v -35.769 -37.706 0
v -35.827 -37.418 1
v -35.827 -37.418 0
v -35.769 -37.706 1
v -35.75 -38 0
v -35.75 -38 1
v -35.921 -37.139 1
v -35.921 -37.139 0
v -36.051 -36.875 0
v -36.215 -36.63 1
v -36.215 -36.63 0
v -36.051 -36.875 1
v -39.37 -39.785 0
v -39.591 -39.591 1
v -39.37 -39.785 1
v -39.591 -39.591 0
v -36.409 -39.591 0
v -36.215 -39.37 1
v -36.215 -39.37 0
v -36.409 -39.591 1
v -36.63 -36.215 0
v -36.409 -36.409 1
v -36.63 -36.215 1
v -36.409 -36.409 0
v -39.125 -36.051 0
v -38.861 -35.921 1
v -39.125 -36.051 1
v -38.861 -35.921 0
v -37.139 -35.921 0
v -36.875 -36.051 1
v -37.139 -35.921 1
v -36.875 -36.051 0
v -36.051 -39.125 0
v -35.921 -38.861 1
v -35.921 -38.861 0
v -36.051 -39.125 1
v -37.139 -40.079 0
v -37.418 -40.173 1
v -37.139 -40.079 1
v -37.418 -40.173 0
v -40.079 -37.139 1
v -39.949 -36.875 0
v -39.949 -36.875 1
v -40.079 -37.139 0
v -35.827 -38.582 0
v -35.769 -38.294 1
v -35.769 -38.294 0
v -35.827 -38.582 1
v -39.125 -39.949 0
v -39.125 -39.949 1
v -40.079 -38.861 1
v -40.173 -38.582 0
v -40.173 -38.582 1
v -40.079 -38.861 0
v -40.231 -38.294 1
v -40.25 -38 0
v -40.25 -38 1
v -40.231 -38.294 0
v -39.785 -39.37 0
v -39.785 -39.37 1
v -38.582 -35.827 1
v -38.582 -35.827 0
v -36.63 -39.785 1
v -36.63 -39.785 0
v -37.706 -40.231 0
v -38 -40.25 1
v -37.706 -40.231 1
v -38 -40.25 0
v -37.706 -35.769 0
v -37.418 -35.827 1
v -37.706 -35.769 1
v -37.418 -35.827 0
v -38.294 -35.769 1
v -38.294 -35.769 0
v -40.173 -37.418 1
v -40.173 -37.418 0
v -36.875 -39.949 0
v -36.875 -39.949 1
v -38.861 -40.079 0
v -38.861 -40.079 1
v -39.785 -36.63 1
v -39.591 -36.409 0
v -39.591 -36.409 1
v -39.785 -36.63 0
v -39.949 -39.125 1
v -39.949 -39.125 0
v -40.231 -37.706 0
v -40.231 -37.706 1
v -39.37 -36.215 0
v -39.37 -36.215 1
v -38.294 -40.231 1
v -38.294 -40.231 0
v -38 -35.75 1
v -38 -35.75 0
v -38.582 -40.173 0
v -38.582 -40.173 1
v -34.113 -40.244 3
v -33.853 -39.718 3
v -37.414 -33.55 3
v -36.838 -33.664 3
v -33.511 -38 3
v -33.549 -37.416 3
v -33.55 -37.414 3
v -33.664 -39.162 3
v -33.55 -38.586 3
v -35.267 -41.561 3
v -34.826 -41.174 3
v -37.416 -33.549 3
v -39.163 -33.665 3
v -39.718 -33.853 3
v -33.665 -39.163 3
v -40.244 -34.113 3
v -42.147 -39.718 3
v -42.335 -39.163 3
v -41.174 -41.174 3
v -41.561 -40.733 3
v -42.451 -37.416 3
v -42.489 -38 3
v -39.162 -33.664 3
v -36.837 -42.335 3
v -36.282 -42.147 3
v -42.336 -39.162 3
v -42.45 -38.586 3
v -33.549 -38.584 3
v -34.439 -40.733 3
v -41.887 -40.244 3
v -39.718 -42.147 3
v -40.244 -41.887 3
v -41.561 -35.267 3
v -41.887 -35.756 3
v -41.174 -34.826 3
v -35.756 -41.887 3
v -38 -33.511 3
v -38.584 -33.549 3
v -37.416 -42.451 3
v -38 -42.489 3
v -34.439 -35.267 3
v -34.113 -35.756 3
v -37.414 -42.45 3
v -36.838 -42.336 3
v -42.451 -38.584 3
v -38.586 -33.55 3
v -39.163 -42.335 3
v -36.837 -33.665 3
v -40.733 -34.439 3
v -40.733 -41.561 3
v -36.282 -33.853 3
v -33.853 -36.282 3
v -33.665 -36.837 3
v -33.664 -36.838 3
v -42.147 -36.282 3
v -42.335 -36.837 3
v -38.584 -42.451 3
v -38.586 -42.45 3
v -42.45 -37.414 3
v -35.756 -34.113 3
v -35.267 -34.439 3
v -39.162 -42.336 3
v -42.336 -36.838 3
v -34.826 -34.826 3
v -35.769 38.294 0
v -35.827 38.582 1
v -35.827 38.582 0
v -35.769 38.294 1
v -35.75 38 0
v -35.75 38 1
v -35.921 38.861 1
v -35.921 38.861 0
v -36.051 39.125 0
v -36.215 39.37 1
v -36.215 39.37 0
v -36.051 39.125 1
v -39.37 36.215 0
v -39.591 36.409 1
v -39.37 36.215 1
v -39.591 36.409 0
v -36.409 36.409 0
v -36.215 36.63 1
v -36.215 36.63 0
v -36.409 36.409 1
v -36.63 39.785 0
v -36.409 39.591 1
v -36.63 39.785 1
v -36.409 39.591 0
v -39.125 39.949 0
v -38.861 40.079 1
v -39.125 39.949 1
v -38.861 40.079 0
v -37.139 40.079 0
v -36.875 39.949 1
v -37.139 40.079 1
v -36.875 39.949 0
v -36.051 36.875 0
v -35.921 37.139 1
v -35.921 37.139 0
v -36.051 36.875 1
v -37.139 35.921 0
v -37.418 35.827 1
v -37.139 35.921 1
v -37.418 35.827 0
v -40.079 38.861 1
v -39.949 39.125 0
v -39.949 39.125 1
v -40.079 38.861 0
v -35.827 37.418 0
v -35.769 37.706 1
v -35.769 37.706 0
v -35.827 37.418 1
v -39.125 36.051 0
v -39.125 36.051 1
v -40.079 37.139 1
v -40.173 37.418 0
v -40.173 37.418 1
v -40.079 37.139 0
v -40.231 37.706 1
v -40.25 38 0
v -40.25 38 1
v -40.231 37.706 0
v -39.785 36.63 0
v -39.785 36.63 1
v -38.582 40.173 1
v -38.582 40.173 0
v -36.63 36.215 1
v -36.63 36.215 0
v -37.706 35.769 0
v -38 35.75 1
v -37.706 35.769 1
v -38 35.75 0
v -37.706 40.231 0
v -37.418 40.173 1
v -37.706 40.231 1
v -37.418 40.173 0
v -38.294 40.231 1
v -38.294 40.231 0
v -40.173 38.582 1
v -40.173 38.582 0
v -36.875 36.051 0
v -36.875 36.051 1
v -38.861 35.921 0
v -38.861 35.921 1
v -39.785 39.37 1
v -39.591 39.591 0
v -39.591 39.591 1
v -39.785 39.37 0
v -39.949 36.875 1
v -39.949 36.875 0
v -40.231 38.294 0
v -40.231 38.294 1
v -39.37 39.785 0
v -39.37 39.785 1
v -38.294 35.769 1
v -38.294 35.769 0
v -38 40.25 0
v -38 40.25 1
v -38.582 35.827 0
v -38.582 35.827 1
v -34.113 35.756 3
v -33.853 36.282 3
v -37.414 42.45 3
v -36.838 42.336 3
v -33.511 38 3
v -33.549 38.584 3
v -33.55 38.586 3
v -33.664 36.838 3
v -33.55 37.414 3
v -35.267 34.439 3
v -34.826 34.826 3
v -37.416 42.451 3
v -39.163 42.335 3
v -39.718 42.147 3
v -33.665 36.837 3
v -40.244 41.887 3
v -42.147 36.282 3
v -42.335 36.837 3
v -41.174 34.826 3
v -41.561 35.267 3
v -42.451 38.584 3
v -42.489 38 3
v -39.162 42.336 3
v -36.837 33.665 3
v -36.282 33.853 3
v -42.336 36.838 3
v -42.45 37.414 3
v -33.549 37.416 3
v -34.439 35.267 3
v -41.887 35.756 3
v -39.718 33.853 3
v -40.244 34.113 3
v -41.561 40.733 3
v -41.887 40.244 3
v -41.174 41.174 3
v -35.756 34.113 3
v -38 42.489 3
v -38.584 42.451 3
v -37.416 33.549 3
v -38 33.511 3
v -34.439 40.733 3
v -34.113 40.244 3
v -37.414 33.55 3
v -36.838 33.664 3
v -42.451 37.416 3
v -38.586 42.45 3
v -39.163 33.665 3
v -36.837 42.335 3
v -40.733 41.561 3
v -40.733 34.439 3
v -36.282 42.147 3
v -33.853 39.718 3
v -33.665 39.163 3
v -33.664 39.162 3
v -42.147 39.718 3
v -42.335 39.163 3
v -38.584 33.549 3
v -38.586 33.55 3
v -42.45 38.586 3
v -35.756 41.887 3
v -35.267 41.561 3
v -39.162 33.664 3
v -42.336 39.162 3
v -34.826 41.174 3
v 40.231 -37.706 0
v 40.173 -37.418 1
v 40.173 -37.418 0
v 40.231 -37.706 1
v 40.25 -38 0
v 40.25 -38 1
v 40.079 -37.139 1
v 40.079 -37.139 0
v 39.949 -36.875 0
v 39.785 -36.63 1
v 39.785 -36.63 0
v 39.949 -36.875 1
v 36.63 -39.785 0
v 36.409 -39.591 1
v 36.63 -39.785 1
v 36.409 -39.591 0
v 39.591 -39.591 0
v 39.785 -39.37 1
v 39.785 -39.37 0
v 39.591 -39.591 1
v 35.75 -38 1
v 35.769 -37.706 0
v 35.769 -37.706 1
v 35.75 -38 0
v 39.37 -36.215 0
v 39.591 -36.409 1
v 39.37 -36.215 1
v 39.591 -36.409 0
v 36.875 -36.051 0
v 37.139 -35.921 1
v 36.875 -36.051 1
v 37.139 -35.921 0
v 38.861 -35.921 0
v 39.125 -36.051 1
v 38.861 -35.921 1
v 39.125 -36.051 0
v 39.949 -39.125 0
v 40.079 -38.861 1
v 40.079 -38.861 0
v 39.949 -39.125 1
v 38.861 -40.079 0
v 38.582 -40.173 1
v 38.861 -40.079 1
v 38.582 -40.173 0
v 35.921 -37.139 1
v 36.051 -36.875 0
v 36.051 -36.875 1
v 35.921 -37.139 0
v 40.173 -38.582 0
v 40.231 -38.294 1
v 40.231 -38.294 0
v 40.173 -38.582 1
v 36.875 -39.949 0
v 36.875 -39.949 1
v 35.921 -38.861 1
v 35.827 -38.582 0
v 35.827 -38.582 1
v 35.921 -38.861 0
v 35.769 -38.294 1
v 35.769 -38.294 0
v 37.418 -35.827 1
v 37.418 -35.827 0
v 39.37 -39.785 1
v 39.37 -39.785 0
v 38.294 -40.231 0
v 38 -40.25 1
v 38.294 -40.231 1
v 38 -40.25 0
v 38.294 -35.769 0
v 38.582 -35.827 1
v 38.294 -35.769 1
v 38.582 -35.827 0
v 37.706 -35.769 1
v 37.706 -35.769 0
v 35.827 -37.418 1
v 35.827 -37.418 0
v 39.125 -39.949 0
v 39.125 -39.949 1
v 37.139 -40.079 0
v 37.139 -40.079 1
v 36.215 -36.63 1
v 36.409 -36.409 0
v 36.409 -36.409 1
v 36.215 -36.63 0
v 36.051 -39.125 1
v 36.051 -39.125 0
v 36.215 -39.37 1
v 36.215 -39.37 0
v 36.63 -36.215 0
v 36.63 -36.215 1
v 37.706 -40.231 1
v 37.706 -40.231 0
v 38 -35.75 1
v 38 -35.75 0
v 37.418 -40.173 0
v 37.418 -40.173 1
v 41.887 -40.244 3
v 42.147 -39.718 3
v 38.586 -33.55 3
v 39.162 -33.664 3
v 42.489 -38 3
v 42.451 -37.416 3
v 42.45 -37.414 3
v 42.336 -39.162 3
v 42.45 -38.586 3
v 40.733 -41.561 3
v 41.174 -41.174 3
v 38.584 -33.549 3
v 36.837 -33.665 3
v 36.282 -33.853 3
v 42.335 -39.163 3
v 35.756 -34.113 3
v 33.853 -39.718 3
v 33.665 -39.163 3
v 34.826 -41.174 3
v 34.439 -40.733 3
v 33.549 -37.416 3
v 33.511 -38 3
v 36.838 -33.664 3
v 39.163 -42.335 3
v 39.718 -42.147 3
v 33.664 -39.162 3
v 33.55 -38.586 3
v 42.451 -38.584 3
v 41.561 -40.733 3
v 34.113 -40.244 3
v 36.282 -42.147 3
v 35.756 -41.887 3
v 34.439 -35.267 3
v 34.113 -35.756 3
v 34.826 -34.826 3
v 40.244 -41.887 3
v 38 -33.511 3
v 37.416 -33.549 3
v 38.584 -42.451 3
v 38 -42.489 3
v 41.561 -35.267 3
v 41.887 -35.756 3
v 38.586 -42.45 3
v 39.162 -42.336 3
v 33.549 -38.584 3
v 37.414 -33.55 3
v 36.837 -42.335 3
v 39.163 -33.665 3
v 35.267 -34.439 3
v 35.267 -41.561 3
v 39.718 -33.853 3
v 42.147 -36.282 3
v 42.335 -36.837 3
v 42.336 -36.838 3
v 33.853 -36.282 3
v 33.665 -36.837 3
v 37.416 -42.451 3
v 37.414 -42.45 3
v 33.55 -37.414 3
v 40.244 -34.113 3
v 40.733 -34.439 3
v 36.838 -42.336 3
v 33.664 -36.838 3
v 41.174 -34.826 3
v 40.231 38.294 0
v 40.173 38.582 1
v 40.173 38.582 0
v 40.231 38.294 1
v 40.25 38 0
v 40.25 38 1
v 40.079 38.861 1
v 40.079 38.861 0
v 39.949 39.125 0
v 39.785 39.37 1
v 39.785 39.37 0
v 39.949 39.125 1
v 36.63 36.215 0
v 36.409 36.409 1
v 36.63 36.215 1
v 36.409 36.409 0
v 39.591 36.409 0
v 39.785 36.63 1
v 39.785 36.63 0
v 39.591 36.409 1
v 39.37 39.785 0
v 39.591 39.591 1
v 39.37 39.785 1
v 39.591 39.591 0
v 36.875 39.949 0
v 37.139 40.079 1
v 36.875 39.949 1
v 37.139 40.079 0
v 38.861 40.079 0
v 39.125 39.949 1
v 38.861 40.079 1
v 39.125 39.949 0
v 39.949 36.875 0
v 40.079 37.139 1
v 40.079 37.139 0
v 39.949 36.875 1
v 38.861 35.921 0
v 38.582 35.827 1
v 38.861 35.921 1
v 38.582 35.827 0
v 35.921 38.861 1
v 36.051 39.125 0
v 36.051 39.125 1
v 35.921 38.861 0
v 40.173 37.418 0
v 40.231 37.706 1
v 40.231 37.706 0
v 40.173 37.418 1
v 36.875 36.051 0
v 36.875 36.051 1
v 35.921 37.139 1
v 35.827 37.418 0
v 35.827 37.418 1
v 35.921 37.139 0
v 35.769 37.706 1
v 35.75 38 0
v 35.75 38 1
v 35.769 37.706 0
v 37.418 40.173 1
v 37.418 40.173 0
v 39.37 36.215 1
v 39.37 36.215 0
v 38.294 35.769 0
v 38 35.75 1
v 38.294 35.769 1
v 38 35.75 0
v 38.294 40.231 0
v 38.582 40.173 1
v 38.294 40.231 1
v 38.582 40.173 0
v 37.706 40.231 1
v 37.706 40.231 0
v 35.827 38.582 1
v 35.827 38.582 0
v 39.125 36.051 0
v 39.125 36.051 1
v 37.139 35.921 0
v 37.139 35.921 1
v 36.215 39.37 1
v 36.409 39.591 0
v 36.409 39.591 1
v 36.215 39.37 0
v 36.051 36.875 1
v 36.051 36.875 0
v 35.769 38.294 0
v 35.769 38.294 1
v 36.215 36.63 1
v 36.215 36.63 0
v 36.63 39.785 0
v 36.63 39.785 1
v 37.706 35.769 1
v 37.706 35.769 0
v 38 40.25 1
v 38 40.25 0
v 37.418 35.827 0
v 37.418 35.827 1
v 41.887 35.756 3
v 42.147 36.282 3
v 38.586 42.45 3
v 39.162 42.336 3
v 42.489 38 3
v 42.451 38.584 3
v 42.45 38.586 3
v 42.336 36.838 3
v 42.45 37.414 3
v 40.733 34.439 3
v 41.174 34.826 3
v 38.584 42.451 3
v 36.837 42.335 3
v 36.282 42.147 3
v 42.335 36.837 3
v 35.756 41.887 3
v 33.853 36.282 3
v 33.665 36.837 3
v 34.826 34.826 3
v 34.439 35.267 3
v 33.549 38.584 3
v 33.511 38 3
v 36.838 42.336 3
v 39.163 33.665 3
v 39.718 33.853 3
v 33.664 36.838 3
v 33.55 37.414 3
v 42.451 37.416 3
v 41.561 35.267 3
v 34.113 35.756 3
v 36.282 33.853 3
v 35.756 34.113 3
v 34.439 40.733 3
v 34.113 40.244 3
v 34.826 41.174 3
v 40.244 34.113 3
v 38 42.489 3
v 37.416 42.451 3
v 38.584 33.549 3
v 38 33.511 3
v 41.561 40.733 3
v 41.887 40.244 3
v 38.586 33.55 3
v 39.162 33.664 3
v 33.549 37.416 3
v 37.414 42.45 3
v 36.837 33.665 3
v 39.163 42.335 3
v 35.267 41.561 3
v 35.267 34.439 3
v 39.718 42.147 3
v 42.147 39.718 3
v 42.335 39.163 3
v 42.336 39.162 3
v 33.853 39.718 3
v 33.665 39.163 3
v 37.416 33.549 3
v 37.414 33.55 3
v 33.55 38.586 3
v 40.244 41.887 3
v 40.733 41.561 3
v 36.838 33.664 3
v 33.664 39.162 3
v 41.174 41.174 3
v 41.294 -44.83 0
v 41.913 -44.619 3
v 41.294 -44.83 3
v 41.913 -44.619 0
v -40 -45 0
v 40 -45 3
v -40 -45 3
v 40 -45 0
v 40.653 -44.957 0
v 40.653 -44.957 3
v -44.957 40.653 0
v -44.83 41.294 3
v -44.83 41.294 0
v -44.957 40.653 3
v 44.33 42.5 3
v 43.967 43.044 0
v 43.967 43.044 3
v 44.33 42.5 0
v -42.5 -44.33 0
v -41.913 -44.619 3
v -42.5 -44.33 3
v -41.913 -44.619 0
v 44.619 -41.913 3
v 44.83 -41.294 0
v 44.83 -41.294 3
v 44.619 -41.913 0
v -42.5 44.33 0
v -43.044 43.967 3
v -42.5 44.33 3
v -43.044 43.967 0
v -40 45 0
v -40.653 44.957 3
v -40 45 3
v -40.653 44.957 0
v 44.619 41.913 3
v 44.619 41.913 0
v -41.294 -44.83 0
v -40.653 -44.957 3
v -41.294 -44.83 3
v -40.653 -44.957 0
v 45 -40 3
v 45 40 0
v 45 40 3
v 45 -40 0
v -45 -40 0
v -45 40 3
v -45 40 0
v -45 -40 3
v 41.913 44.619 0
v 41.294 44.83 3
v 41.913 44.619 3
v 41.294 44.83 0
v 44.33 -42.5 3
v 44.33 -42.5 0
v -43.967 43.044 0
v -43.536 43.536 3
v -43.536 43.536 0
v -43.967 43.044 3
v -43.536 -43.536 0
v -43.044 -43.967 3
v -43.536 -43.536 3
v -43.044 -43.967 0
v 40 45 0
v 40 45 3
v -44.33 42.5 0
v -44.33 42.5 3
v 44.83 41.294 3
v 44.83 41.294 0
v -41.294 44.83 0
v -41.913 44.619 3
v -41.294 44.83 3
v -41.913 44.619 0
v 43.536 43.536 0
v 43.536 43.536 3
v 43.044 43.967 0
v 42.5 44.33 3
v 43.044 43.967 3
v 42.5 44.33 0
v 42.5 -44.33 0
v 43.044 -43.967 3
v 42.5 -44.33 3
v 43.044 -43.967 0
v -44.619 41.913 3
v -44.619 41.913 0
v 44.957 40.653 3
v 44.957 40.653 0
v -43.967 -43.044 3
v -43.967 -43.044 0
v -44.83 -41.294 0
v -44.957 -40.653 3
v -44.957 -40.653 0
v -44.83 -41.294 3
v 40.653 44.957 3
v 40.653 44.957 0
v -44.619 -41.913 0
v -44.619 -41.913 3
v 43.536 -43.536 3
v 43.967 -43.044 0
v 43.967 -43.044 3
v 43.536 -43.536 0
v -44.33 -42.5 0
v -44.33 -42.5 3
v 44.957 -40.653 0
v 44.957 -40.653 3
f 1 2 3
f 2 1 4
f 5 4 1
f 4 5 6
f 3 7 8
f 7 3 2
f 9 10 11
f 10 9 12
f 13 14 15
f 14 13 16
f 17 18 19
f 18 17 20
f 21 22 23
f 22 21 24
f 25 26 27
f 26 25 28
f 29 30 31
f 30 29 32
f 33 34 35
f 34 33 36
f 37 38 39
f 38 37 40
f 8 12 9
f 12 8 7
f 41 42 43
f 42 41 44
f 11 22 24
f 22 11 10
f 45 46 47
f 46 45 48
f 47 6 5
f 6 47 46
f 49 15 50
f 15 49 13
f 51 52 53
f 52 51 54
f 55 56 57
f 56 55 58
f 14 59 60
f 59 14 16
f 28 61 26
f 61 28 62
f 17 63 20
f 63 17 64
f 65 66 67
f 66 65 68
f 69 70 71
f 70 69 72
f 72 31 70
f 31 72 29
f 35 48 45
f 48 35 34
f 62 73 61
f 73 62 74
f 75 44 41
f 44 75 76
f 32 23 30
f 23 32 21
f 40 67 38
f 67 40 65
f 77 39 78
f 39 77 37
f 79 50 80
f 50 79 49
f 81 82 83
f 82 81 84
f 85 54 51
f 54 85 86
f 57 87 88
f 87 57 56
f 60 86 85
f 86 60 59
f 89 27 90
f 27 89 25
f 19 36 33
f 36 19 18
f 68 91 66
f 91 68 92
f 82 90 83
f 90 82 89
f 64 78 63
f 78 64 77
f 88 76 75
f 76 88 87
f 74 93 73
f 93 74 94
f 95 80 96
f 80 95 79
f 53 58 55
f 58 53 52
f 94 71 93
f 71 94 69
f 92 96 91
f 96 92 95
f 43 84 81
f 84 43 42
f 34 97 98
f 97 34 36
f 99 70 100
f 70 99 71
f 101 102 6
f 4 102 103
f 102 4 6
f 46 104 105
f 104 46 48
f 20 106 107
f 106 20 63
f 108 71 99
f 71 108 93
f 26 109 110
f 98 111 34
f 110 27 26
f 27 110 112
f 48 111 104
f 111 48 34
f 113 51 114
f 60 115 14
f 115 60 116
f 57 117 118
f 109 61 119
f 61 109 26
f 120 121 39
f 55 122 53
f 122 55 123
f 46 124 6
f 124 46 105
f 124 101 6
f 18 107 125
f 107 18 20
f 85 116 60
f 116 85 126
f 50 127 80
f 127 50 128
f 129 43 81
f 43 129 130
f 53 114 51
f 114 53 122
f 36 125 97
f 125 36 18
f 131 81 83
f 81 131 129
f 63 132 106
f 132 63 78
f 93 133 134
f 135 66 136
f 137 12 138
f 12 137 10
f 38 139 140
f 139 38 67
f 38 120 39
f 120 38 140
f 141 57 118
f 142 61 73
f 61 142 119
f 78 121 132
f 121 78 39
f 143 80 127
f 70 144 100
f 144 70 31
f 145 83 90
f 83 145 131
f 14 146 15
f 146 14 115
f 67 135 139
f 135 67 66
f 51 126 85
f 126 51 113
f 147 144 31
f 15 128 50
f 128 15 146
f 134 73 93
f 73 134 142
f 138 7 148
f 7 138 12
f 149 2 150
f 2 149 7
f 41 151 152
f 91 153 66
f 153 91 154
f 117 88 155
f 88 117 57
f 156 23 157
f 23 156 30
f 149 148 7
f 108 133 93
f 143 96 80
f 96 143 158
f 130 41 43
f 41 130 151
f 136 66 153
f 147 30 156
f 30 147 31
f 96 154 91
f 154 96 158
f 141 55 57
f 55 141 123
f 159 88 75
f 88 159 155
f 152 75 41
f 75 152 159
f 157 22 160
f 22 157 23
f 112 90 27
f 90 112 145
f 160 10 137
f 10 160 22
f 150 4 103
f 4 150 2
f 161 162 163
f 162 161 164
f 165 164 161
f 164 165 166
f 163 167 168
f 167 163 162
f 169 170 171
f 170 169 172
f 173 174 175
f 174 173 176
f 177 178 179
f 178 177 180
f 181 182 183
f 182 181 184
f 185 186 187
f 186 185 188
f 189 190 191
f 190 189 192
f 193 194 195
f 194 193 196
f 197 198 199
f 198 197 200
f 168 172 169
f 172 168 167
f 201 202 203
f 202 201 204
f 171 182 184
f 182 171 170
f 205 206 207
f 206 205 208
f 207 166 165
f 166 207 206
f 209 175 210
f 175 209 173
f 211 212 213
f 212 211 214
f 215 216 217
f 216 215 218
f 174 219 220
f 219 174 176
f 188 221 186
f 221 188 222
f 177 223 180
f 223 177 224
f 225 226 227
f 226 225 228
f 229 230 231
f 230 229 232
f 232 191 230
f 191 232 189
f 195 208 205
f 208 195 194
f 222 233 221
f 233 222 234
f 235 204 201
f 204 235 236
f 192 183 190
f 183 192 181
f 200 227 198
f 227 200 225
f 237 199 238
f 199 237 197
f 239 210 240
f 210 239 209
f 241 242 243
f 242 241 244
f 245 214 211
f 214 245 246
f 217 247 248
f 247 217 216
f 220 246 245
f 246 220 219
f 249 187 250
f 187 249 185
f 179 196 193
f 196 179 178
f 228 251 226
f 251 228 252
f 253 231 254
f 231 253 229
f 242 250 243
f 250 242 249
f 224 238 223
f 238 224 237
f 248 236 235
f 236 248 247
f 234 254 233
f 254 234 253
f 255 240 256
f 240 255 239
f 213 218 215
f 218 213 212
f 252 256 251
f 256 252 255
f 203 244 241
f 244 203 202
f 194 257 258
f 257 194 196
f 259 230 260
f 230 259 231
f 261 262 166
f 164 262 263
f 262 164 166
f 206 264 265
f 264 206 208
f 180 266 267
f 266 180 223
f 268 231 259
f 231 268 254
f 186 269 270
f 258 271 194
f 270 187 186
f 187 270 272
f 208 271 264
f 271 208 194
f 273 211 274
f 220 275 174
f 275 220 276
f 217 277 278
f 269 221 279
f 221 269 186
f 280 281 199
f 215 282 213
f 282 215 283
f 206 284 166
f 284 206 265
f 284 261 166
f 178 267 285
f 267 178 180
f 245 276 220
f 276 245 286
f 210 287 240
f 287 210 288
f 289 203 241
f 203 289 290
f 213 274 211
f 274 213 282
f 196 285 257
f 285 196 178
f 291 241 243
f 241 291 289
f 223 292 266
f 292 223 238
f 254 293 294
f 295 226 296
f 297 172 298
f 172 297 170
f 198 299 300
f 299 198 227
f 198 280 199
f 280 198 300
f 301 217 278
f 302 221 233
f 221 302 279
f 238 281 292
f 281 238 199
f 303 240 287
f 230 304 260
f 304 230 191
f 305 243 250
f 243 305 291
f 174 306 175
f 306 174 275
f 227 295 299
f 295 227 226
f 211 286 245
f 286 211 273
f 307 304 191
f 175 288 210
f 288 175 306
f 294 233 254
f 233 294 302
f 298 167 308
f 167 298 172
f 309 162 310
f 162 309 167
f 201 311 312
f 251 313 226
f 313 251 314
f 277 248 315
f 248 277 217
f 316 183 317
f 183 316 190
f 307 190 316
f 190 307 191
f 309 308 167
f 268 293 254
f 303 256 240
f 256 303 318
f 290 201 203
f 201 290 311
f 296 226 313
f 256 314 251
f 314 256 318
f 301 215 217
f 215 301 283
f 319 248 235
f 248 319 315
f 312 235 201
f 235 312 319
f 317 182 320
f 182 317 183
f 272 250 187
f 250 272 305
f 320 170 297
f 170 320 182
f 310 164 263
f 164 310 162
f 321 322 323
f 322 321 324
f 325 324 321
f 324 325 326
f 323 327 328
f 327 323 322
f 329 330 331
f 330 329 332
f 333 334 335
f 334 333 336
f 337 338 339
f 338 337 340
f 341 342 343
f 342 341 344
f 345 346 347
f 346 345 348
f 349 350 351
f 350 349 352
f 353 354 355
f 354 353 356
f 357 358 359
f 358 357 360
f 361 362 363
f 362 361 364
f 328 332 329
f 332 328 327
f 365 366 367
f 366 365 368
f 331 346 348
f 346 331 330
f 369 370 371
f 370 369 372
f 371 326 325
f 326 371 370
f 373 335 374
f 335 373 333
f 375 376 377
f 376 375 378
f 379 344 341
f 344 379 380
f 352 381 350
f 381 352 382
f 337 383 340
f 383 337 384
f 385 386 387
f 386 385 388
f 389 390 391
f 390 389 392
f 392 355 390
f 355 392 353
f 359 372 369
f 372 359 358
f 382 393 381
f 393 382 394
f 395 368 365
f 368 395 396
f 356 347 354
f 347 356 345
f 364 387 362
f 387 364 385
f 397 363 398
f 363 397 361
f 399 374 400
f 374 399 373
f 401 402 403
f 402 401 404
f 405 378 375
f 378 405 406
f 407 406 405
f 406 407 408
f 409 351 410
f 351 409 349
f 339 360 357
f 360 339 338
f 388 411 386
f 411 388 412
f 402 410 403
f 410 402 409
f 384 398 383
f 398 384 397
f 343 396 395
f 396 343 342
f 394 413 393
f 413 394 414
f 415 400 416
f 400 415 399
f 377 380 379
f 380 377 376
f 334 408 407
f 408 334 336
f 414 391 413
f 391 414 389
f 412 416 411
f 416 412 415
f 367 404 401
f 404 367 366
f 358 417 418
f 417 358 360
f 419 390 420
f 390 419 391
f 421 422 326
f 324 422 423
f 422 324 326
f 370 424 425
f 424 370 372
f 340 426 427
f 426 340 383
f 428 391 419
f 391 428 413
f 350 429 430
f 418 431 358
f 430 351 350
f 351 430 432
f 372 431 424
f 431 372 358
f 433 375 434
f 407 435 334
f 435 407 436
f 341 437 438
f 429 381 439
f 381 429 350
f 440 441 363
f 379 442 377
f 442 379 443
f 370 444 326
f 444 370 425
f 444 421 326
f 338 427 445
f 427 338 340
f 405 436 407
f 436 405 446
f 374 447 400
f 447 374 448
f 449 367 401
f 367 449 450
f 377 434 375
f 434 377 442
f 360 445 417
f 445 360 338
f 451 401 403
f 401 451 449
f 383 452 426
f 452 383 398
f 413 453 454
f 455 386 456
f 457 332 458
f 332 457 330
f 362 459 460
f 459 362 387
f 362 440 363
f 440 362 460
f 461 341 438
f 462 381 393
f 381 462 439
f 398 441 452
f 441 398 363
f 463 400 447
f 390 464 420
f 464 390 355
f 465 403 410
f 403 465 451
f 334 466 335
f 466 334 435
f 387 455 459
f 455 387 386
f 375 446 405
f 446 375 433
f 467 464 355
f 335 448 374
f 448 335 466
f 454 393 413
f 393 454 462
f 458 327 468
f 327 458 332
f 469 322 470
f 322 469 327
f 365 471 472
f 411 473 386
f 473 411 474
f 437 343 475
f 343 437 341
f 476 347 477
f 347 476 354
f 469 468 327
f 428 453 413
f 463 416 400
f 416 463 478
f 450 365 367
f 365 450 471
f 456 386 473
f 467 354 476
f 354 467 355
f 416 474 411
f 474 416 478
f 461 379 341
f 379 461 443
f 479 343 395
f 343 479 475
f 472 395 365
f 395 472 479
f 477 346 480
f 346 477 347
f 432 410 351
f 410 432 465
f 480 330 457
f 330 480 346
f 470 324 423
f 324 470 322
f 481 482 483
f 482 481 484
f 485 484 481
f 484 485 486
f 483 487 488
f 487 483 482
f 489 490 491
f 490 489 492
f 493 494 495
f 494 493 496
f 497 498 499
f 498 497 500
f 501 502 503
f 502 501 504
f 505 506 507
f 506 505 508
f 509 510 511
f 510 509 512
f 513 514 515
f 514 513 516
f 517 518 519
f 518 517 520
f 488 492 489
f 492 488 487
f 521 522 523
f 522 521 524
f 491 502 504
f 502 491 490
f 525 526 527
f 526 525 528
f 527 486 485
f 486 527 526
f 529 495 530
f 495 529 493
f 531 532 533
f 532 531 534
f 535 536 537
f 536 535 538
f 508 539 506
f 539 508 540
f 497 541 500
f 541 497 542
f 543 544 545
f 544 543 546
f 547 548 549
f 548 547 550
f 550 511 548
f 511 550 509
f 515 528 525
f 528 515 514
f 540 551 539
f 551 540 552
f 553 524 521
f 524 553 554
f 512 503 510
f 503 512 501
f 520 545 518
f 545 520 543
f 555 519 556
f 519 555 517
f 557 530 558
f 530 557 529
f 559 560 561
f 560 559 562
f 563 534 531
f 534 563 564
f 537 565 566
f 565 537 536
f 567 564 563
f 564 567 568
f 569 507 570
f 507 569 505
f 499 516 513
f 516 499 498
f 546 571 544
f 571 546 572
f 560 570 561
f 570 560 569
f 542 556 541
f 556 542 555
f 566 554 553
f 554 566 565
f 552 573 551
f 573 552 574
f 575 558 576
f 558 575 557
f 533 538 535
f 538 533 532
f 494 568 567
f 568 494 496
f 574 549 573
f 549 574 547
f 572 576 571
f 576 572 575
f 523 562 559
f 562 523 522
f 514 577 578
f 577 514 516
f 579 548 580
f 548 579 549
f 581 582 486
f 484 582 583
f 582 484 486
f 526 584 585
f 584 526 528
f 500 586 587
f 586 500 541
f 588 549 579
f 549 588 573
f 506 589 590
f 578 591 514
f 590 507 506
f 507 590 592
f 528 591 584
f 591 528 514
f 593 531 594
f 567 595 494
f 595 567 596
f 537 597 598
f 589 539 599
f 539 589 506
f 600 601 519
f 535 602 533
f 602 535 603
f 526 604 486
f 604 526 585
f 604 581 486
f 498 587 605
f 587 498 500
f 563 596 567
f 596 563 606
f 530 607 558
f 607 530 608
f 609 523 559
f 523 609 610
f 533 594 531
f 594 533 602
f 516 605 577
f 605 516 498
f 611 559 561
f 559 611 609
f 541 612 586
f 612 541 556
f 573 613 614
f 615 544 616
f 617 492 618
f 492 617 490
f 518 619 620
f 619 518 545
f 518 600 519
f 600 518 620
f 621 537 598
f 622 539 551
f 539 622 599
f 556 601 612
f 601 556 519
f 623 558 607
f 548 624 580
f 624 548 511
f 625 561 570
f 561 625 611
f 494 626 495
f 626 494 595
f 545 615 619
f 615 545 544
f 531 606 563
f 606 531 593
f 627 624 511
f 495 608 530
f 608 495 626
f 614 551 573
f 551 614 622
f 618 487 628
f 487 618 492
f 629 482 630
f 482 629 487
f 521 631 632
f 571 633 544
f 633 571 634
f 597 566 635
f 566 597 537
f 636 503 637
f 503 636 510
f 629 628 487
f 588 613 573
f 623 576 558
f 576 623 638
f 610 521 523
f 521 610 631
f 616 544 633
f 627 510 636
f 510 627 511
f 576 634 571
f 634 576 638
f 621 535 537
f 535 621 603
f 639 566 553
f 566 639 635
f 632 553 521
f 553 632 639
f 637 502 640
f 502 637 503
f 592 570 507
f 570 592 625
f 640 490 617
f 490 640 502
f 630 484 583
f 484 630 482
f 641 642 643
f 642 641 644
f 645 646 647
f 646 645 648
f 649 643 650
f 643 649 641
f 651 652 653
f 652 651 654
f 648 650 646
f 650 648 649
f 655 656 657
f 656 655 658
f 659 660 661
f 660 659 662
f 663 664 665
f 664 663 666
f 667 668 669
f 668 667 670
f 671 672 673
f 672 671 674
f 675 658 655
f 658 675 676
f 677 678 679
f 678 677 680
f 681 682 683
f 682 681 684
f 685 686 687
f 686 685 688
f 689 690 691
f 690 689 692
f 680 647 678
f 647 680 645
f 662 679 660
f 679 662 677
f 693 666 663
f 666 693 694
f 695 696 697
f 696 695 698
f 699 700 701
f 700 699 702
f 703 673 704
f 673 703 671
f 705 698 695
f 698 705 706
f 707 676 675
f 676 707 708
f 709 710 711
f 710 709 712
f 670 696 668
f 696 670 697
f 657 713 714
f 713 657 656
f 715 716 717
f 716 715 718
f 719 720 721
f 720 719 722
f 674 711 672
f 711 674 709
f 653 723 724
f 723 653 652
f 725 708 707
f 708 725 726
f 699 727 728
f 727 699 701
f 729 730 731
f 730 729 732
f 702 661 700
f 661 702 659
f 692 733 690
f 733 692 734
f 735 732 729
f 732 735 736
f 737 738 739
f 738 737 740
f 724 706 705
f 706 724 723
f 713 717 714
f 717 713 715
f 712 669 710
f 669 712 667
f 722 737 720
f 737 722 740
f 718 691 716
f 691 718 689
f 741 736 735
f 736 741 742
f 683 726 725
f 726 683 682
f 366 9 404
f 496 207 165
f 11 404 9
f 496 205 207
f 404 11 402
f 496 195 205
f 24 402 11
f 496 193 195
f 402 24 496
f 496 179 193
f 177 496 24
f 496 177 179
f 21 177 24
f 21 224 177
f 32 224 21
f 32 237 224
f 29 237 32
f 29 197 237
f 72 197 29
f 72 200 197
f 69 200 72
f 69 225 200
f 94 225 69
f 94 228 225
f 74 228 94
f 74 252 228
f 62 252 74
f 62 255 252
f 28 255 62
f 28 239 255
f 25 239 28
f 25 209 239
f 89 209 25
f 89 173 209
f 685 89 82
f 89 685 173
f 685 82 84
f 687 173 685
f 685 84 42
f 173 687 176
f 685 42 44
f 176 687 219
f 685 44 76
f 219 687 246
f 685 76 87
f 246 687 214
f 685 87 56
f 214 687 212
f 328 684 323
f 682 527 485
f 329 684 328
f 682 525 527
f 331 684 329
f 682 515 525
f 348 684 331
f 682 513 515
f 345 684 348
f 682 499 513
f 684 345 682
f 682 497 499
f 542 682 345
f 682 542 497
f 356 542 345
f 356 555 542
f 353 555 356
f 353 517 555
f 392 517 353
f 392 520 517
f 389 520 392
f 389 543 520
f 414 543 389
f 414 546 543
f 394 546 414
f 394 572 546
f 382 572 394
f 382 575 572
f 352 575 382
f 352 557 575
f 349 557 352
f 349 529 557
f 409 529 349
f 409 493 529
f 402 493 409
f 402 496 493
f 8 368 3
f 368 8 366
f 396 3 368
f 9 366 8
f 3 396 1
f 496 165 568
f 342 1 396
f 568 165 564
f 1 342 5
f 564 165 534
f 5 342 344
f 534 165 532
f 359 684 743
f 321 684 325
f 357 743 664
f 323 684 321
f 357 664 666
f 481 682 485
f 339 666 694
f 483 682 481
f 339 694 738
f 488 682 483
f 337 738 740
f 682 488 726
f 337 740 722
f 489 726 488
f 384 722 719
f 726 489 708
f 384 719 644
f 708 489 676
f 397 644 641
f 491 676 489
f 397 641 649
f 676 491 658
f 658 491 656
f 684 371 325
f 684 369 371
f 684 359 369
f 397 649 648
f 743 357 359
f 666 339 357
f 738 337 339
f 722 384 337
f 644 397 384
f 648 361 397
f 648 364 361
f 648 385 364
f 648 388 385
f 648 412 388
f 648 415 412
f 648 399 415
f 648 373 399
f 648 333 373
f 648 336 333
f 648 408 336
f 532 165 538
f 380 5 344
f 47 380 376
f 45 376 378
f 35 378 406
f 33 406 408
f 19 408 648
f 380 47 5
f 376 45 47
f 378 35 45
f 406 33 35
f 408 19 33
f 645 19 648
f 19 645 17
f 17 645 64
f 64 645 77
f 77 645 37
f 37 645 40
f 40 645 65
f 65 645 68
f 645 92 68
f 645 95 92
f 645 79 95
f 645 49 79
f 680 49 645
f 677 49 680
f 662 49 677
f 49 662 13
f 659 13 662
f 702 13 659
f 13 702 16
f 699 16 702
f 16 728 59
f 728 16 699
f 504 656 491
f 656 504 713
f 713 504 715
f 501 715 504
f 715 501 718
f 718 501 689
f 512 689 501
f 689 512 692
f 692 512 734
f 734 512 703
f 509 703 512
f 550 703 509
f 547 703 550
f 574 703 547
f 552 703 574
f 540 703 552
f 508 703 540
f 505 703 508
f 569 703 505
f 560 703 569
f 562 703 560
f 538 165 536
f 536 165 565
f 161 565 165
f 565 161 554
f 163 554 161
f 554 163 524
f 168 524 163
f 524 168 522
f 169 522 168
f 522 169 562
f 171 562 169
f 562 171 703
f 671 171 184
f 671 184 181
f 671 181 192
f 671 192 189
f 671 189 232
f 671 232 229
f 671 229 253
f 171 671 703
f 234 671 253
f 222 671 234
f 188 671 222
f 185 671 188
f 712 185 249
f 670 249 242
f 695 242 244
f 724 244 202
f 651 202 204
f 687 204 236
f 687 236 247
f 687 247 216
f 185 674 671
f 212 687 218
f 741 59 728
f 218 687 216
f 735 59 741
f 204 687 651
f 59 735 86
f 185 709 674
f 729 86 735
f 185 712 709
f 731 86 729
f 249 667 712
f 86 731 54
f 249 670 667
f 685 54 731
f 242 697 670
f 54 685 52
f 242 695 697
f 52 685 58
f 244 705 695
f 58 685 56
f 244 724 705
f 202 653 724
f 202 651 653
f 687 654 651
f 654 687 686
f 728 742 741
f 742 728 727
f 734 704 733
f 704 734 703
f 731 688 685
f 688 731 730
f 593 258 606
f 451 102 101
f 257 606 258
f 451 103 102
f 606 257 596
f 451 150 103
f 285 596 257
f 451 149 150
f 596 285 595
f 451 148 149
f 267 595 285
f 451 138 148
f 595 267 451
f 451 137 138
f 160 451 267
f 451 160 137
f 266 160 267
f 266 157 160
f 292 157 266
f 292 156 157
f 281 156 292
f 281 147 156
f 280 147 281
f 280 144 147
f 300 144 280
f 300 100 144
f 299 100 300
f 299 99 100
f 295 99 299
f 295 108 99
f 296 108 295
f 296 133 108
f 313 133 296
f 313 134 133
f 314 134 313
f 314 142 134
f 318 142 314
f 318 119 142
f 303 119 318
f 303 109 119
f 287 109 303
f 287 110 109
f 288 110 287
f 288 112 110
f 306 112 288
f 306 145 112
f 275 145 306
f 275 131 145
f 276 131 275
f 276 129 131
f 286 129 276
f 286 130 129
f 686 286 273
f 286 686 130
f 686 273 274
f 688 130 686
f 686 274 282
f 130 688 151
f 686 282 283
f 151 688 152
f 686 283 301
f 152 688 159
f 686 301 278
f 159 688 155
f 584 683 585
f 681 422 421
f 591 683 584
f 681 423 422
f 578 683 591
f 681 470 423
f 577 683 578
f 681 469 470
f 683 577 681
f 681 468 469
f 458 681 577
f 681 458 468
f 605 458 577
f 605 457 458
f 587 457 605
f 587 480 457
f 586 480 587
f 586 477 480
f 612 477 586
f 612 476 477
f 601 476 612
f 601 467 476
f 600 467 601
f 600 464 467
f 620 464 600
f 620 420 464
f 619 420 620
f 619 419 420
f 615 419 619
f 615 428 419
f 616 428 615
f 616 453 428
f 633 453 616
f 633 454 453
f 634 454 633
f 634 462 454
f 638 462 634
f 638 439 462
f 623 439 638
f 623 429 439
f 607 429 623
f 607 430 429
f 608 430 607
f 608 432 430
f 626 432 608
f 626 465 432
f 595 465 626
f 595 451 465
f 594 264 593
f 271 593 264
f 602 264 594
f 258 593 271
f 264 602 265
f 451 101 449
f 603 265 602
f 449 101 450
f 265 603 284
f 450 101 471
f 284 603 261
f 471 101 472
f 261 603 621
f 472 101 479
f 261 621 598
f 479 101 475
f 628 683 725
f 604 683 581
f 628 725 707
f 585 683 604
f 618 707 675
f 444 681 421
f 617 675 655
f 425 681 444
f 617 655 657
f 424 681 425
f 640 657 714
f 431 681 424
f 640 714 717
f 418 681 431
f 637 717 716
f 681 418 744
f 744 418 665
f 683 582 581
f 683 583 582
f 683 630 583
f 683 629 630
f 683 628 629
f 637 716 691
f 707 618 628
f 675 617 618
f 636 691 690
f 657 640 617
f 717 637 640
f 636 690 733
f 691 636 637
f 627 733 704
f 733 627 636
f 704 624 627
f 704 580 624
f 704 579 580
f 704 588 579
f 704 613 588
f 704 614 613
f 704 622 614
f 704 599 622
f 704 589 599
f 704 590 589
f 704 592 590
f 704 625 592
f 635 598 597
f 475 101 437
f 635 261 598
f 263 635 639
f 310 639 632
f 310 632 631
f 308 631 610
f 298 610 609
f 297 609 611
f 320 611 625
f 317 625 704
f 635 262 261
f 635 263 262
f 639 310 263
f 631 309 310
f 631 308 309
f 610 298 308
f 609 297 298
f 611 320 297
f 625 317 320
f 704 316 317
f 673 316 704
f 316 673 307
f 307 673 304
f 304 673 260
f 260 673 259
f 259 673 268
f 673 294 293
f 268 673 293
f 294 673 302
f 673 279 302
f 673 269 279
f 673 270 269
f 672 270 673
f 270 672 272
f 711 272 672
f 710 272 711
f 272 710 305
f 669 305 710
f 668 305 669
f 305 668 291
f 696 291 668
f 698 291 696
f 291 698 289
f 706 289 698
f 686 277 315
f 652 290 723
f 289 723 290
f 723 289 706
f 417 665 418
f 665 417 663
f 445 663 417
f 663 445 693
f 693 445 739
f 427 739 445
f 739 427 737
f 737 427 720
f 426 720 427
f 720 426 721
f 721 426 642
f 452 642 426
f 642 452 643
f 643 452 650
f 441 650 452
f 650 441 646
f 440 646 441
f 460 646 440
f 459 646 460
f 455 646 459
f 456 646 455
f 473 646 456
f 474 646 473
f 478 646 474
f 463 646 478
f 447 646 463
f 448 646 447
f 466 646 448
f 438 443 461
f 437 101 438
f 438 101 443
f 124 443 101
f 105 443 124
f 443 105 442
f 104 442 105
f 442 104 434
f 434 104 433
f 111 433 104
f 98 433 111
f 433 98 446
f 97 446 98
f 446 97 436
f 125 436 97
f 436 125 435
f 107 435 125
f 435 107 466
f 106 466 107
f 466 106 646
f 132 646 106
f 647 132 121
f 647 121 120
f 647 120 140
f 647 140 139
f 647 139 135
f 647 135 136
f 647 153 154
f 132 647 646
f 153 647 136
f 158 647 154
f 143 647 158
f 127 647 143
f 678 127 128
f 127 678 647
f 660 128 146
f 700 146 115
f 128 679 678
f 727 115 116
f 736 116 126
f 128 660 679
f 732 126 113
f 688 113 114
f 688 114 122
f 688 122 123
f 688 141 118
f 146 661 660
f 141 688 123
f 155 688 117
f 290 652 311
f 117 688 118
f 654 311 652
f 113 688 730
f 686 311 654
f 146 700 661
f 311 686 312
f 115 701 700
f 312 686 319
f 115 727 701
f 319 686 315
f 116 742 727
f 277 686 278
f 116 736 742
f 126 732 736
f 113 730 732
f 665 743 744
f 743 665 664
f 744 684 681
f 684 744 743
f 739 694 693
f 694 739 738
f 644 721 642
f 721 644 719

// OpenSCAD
// Rounded mounting plate - a flat plate with rounded corners and a countersunk screw hole near each
// corner. Teaches 2D corner rounding with offset() and a countersink (chamfered hole). NOVEL part.
//
// @desc flat plate, rounded corners, countersunk holes
// @prompt Design a mounting plate in OpenSCAD: {L} by {W} mm and {t} mm thick, with {r} mm rounded corners and a countersunk hole for an {screw} mm screw near each corner. Reply with a single complete OpenSCAD file.
// @param L     length, mm           [40:120]
// @param W     width, mm            [30:90]
// @param t     thickness, mm        [3:8]
// @param r     corner radius, mm    [3:12]
// @param screw screw diameter, mm   [3:6]

L     = 90;
W     = 90;
t     = 3;
r     = 5;
screw = 4.5;

$fn = 48;

inset = r + 2;                     // hole-centre inset from the edges
head  = screw * 2;                 // countersink top diameter
csk   = min(screw, t - 1);         // countersink depth

module rounded_rect(l, w, rad) {
    offset(r = rad) square([l - 2 * rad, w - 2 * rad], center = true);
}

difference() {
    linear_extrude(t) rounded_rect(L, W, r);
    for (sx = [-1, 1], sy = [-1, 1])
        translate([sx * (L / 2 - inset), sy * (W / 2 - inset), 0]) {
            translate([0, 0, -1]) cylinder(h = t + 2, d = screw);                       // shank
            translate([0, 0, t - csk]) cylinder(h = csk + 0.01, d1 = screw, d2 = head); // countersink
        }
}
